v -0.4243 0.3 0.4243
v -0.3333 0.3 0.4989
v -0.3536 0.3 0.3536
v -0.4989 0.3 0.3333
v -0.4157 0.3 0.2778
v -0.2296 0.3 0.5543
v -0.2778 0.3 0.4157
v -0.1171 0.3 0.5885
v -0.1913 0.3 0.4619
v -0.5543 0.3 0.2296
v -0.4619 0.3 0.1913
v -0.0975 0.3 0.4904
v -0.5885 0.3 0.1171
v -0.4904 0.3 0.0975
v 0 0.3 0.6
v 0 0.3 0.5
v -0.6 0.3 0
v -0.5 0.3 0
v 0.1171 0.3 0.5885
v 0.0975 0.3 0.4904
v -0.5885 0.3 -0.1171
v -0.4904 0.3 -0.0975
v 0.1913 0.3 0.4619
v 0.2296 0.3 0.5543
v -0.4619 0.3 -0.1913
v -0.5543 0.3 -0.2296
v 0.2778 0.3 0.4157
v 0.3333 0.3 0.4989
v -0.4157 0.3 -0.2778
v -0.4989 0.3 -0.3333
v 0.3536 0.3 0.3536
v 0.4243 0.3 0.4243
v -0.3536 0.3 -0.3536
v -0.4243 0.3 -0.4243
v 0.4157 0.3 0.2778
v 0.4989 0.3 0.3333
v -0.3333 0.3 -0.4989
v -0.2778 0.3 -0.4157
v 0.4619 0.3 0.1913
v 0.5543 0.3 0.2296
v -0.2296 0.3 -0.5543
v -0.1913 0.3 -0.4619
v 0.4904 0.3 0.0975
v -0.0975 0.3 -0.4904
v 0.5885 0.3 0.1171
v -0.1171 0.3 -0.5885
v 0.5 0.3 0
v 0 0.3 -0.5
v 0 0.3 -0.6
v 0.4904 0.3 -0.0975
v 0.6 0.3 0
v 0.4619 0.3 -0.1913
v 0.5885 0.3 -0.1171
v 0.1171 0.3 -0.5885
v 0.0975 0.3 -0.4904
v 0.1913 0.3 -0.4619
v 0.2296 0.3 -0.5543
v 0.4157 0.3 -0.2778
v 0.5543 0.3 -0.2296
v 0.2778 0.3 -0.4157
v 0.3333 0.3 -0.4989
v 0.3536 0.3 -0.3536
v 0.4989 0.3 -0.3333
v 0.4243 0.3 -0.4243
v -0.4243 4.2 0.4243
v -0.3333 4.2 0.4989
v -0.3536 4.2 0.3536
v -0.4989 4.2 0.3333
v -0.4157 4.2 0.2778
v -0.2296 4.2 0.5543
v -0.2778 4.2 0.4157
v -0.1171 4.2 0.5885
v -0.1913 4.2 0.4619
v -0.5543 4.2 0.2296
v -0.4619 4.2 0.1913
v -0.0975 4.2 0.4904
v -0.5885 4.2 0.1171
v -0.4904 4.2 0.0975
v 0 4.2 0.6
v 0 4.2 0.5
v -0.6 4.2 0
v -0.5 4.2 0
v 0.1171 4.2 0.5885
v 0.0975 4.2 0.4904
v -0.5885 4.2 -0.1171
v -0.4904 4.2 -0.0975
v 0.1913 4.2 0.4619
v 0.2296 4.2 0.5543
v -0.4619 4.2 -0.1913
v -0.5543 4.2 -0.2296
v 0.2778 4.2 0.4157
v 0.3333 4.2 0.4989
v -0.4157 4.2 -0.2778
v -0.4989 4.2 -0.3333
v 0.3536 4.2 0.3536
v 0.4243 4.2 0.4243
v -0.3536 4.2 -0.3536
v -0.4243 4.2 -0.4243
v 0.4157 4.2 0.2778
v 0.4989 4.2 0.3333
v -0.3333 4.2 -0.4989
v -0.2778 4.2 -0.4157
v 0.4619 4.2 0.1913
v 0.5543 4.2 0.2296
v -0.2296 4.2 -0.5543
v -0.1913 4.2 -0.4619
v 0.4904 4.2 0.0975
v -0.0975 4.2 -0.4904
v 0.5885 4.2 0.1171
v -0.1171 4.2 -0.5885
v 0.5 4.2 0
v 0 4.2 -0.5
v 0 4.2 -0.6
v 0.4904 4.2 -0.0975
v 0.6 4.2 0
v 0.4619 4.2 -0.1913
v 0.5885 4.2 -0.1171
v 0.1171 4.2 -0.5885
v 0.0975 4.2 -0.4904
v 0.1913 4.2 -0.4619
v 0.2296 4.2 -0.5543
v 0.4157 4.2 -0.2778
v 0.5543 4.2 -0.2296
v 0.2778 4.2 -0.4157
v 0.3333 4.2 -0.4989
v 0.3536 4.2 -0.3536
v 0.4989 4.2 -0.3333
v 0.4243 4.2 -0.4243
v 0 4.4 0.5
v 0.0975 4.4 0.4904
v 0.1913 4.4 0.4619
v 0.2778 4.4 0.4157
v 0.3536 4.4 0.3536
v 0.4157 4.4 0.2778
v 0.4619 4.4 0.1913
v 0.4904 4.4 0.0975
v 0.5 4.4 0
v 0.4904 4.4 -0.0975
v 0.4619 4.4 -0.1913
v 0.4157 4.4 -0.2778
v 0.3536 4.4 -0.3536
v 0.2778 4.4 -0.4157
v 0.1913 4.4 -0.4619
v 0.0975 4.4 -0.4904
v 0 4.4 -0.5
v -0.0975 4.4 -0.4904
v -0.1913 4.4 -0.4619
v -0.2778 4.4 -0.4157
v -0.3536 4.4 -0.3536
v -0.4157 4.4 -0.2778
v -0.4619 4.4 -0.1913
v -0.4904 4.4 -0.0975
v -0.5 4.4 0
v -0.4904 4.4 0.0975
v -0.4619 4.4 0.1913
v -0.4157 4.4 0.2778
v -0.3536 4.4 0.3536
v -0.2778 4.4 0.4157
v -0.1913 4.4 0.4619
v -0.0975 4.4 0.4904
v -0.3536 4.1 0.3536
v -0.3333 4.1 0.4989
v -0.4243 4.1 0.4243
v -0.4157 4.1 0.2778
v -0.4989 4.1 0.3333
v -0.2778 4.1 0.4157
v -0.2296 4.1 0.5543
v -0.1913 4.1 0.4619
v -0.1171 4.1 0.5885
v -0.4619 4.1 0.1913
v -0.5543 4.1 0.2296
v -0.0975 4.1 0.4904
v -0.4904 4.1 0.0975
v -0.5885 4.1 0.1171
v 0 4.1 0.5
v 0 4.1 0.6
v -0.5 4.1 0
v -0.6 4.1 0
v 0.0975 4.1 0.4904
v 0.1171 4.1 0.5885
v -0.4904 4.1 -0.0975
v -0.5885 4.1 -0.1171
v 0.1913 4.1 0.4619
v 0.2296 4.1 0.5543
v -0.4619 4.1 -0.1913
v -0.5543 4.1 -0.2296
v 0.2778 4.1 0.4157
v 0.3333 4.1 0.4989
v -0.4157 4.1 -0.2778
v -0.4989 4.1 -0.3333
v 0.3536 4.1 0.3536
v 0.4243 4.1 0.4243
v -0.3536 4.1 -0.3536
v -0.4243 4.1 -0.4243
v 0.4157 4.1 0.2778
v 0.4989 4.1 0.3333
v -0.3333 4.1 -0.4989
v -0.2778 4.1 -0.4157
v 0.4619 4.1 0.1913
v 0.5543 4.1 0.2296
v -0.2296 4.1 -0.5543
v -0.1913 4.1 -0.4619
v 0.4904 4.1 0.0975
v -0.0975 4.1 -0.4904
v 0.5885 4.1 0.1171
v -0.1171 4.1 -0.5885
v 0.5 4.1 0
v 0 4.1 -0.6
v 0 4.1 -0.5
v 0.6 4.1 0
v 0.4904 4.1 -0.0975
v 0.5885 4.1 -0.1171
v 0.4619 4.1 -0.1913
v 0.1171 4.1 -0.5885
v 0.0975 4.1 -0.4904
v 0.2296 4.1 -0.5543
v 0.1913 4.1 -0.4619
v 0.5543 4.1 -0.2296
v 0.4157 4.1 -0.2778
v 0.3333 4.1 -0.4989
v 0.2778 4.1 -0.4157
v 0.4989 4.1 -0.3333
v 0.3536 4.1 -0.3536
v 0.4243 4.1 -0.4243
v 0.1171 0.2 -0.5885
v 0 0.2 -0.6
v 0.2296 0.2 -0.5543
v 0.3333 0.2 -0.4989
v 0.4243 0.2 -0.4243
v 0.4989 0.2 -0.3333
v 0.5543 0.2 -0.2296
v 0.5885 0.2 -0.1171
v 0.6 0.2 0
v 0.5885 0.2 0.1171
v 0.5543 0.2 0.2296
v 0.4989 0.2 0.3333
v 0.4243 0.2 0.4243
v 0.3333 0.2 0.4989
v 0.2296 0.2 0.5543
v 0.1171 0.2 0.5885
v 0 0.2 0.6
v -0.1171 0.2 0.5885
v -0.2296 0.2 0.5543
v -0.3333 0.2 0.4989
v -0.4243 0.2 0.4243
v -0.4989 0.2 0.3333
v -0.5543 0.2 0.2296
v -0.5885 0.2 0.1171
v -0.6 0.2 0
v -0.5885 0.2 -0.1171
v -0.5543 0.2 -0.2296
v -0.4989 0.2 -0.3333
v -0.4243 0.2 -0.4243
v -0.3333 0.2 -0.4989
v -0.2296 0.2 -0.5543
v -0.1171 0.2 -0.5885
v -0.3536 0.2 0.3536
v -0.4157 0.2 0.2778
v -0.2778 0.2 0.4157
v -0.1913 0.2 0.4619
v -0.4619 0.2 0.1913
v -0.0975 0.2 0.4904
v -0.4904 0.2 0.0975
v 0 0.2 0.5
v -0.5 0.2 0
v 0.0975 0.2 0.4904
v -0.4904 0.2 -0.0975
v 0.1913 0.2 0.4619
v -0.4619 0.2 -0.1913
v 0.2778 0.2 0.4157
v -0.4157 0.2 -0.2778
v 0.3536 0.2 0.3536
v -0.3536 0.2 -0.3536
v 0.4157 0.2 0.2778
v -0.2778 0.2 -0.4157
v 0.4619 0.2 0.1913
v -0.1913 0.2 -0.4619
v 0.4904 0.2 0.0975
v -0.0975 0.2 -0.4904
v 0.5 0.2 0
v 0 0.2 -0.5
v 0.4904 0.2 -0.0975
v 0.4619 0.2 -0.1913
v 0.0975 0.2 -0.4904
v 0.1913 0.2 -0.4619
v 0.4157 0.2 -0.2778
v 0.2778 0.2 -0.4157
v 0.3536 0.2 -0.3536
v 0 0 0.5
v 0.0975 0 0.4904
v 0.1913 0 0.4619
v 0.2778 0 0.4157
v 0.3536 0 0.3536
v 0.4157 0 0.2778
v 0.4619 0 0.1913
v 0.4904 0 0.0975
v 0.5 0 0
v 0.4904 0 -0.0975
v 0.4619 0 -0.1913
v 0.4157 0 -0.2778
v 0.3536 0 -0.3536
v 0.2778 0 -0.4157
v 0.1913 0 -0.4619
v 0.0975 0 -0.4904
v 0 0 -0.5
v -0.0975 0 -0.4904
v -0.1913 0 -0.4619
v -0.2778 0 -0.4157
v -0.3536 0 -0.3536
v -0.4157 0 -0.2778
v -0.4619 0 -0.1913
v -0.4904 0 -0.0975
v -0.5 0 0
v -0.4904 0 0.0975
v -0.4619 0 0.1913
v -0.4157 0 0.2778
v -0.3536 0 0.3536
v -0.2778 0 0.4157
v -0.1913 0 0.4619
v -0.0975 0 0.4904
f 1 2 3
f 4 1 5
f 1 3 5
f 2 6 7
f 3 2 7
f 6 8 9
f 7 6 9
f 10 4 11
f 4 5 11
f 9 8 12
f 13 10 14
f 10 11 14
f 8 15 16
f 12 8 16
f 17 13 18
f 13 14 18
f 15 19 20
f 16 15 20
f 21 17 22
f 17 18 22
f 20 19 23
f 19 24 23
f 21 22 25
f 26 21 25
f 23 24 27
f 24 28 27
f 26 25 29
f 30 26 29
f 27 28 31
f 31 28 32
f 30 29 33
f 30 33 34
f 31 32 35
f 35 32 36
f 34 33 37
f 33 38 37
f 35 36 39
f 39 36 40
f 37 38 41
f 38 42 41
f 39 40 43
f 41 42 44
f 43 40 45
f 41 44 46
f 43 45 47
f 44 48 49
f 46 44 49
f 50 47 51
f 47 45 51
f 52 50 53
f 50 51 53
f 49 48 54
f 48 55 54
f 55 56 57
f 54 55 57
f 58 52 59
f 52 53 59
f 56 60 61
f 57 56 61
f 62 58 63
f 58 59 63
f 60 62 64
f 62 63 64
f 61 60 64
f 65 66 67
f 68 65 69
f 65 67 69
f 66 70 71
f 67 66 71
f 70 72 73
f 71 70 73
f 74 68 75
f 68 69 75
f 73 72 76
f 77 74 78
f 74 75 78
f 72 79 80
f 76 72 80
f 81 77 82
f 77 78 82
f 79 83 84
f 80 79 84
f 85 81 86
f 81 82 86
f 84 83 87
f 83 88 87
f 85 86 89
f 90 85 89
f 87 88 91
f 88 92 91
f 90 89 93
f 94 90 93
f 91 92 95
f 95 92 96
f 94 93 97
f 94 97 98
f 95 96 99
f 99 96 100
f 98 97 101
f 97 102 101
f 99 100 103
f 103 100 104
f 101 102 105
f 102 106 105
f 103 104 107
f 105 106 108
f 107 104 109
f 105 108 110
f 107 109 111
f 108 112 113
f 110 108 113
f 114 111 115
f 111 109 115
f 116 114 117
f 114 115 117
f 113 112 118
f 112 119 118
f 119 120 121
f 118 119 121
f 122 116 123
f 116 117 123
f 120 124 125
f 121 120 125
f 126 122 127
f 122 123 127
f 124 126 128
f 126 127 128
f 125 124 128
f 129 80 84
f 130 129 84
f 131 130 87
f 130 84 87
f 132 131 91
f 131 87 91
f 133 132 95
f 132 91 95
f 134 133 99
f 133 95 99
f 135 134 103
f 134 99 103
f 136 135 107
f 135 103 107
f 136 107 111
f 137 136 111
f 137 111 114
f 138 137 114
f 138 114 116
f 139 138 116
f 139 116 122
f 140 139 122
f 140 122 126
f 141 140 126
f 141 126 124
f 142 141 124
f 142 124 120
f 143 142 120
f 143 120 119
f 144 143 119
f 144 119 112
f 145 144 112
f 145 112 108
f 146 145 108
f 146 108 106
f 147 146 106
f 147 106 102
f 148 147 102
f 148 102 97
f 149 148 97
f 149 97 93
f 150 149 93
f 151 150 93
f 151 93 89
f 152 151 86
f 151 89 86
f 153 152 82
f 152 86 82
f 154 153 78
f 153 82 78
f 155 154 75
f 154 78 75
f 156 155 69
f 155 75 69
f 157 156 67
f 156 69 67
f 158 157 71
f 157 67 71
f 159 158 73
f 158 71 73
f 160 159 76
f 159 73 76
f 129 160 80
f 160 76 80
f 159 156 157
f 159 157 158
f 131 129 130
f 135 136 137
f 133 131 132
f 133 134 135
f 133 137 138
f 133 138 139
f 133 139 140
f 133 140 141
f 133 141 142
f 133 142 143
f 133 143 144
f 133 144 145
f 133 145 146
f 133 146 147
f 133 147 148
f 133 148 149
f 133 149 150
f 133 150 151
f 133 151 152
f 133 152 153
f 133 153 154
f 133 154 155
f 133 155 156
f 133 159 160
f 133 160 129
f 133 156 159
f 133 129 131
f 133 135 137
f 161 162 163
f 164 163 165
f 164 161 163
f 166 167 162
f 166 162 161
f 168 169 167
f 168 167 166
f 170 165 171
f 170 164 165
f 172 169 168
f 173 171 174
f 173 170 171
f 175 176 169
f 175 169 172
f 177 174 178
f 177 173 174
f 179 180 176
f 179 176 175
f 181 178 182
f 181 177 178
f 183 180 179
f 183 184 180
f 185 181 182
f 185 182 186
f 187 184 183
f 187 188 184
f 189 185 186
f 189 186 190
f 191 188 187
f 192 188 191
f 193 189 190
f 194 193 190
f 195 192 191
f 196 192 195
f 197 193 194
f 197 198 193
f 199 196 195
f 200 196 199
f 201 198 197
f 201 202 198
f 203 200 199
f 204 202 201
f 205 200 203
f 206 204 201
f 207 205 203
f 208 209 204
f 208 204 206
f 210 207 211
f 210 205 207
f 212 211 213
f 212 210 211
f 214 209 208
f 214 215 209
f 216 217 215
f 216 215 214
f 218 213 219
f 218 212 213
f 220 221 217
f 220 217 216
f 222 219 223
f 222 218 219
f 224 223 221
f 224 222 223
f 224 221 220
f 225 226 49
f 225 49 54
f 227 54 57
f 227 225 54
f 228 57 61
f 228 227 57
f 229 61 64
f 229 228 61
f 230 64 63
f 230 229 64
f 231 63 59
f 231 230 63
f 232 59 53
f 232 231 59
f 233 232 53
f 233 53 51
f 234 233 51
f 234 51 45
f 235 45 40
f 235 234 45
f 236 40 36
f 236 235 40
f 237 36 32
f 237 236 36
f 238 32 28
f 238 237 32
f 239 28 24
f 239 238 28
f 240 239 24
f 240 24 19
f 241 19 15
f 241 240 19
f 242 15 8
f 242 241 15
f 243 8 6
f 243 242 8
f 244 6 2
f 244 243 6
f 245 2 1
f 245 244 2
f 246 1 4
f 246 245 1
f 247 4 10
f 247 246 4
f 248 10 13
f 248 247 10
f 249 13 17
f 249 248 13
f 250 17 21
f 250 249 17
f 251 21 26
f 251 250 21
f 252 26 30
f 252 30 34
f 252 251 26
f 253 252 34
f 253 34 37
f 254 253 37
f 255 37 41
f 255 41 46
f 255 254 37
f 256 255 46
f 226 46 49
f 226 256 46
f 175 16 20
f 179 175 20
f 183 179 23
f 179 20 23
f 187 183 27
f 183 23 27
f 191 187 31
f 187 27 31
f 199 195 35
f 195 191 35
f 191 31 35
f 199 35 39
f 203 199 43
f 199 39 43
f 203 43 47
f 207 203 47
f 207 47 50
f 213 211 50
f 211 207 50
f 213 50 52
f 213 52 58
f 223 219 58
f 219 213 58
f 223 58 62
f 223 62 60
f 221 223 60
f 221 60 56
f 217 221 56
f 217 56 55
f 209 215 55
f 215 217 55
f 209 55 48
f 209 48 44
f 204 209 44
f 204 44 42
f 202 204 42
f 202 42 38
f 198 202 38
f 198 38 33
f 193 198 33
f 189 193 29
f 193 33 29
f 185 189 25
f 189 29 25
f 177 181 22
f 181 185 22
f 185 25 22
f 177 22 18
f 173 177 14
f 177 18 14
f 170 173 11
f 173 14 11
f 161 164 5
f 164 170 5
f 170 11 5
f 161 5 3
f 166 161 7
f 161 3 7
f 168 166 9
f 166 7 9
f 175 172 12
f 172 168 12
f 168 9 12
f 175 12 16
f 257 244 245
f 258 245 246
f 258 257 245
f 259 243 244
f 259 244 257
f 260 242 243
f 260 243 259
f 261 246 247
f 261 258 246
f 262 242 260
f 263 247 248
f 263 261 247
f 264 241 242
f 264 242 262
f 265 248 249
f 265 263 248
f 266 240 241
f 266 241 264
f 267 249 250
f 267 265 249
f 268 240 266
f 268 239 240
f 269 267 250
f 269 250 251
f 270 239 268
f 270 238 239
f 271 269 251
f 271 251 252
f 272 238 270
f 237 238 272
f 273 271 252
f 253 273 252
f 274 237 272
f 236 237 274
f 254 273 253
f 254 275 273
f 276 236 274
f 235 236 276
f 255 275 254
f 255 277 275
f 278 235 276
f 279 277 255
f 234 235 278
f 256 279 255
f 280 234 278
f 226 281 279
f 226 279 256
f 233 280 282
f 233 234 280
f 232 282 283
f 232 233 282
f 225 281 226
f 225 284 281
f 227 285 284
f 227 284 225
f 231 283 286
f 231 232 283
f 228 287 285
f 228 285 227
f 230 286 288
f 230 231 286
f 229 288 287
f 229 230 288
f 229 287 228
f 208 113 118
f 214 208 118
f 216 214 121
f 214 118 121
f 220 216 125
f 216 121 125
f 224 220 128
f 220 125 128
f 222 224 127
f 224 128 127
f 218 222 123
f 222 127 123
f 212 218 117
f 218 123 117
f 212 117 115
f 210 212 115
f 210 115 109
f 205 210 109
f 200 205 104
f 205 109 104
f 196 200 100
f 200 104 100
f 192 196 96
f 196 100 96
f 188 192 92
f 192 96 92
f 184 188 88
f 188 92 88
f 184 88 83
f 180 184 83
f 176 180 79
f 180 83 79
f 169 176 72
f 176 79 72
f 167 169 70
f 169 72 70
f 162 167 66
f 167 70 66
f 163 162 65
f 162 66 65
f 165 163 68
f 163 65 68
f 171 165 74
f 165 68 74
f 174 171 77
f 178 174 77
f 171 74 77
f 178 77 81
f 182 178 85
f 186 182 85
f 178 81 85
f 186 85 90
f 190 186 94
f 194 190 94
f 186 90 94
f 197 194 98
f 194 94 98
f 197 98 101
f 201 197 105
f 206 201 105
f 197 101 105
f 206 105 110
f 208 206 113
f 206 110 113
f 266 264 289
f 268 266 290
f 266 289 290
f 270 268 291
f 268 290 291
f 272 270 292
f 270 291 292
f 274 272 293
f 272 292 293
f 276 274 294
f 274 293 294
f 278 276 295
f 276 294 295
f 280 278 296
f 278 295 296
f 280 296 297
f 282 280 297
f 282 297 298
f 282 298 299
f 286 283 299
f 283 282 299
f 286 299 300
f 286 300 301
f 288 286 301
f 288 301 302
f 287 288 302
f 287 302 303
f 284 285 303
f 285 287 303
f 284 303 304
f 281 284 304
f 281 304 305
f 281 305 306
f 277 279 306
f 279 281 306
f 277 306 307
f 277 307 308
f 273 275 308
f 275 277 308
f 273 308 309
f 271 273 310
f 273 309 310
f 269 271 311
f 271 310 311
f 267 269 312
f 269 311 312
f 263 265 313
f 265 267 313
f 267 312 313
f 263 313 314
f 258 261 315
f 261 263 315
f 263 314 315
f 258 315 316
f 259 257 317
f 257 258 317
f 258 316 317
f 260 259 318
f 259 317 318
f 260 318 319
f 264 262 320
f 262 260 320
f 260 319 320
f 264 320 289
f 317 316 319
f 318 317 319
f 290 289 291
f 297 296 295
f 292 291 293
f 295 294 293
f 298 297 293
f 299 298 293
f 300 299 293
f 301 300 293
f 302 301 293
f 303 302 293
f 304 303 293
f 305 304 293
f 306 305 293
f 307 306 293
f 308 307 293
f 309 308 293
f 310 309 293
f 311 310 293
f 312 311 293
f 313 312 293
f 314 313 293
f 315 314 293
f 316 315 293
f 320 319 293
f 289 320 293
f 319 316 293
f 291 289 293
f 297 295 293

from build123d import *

# Parameters (mm, degrees)
CROQUIS1_R              = 0.5
SALIENTE_EXTRUIR1_DEPTH = 4.4
SALIENTE_EXTRUIR2_START = -0.2
CROQUIS2_R              = 0.6
SALIENTE_EXTRUIR2_DEPTH = 0.1


with BuildPart() as part:
    # Croquis1 → Saliente-Extruir1 (new body)
    with BuildSketch(Plane(origin=(0, 0, 0), x_dir=(1, 0, 0), z_dir=(0, 1, 0))):
        with Locations(Location((0, 0, 0), (0, 0, 270))):
            Circle(CROQUIS1_R)
    extrude(amount=SALIENTE_EXTRUIR1_DEPTH)

    # Croquis2 → Saliente-Extruir2 (add)
    with BuildSketch(Plane.XZ.offset(SALIENTE_EXTRUIR2_START)):
        with Locations(Location((0, 0, 0), (0, 0, 270))):
            Circle(CROQUIS2_R)
    saliente_extruir2 = extrude(amount=-SALIENTE_EXTRUIR2_DEPTH)

    # Simetría1: Saliente-Extruir2 across plane
    add(saliente_extruir2.mirror(Plane(origin=(0, 2.2, 0), x_dir=(0, 0, 1), z_dir=(0, -1, 0))))


solid = part.part
